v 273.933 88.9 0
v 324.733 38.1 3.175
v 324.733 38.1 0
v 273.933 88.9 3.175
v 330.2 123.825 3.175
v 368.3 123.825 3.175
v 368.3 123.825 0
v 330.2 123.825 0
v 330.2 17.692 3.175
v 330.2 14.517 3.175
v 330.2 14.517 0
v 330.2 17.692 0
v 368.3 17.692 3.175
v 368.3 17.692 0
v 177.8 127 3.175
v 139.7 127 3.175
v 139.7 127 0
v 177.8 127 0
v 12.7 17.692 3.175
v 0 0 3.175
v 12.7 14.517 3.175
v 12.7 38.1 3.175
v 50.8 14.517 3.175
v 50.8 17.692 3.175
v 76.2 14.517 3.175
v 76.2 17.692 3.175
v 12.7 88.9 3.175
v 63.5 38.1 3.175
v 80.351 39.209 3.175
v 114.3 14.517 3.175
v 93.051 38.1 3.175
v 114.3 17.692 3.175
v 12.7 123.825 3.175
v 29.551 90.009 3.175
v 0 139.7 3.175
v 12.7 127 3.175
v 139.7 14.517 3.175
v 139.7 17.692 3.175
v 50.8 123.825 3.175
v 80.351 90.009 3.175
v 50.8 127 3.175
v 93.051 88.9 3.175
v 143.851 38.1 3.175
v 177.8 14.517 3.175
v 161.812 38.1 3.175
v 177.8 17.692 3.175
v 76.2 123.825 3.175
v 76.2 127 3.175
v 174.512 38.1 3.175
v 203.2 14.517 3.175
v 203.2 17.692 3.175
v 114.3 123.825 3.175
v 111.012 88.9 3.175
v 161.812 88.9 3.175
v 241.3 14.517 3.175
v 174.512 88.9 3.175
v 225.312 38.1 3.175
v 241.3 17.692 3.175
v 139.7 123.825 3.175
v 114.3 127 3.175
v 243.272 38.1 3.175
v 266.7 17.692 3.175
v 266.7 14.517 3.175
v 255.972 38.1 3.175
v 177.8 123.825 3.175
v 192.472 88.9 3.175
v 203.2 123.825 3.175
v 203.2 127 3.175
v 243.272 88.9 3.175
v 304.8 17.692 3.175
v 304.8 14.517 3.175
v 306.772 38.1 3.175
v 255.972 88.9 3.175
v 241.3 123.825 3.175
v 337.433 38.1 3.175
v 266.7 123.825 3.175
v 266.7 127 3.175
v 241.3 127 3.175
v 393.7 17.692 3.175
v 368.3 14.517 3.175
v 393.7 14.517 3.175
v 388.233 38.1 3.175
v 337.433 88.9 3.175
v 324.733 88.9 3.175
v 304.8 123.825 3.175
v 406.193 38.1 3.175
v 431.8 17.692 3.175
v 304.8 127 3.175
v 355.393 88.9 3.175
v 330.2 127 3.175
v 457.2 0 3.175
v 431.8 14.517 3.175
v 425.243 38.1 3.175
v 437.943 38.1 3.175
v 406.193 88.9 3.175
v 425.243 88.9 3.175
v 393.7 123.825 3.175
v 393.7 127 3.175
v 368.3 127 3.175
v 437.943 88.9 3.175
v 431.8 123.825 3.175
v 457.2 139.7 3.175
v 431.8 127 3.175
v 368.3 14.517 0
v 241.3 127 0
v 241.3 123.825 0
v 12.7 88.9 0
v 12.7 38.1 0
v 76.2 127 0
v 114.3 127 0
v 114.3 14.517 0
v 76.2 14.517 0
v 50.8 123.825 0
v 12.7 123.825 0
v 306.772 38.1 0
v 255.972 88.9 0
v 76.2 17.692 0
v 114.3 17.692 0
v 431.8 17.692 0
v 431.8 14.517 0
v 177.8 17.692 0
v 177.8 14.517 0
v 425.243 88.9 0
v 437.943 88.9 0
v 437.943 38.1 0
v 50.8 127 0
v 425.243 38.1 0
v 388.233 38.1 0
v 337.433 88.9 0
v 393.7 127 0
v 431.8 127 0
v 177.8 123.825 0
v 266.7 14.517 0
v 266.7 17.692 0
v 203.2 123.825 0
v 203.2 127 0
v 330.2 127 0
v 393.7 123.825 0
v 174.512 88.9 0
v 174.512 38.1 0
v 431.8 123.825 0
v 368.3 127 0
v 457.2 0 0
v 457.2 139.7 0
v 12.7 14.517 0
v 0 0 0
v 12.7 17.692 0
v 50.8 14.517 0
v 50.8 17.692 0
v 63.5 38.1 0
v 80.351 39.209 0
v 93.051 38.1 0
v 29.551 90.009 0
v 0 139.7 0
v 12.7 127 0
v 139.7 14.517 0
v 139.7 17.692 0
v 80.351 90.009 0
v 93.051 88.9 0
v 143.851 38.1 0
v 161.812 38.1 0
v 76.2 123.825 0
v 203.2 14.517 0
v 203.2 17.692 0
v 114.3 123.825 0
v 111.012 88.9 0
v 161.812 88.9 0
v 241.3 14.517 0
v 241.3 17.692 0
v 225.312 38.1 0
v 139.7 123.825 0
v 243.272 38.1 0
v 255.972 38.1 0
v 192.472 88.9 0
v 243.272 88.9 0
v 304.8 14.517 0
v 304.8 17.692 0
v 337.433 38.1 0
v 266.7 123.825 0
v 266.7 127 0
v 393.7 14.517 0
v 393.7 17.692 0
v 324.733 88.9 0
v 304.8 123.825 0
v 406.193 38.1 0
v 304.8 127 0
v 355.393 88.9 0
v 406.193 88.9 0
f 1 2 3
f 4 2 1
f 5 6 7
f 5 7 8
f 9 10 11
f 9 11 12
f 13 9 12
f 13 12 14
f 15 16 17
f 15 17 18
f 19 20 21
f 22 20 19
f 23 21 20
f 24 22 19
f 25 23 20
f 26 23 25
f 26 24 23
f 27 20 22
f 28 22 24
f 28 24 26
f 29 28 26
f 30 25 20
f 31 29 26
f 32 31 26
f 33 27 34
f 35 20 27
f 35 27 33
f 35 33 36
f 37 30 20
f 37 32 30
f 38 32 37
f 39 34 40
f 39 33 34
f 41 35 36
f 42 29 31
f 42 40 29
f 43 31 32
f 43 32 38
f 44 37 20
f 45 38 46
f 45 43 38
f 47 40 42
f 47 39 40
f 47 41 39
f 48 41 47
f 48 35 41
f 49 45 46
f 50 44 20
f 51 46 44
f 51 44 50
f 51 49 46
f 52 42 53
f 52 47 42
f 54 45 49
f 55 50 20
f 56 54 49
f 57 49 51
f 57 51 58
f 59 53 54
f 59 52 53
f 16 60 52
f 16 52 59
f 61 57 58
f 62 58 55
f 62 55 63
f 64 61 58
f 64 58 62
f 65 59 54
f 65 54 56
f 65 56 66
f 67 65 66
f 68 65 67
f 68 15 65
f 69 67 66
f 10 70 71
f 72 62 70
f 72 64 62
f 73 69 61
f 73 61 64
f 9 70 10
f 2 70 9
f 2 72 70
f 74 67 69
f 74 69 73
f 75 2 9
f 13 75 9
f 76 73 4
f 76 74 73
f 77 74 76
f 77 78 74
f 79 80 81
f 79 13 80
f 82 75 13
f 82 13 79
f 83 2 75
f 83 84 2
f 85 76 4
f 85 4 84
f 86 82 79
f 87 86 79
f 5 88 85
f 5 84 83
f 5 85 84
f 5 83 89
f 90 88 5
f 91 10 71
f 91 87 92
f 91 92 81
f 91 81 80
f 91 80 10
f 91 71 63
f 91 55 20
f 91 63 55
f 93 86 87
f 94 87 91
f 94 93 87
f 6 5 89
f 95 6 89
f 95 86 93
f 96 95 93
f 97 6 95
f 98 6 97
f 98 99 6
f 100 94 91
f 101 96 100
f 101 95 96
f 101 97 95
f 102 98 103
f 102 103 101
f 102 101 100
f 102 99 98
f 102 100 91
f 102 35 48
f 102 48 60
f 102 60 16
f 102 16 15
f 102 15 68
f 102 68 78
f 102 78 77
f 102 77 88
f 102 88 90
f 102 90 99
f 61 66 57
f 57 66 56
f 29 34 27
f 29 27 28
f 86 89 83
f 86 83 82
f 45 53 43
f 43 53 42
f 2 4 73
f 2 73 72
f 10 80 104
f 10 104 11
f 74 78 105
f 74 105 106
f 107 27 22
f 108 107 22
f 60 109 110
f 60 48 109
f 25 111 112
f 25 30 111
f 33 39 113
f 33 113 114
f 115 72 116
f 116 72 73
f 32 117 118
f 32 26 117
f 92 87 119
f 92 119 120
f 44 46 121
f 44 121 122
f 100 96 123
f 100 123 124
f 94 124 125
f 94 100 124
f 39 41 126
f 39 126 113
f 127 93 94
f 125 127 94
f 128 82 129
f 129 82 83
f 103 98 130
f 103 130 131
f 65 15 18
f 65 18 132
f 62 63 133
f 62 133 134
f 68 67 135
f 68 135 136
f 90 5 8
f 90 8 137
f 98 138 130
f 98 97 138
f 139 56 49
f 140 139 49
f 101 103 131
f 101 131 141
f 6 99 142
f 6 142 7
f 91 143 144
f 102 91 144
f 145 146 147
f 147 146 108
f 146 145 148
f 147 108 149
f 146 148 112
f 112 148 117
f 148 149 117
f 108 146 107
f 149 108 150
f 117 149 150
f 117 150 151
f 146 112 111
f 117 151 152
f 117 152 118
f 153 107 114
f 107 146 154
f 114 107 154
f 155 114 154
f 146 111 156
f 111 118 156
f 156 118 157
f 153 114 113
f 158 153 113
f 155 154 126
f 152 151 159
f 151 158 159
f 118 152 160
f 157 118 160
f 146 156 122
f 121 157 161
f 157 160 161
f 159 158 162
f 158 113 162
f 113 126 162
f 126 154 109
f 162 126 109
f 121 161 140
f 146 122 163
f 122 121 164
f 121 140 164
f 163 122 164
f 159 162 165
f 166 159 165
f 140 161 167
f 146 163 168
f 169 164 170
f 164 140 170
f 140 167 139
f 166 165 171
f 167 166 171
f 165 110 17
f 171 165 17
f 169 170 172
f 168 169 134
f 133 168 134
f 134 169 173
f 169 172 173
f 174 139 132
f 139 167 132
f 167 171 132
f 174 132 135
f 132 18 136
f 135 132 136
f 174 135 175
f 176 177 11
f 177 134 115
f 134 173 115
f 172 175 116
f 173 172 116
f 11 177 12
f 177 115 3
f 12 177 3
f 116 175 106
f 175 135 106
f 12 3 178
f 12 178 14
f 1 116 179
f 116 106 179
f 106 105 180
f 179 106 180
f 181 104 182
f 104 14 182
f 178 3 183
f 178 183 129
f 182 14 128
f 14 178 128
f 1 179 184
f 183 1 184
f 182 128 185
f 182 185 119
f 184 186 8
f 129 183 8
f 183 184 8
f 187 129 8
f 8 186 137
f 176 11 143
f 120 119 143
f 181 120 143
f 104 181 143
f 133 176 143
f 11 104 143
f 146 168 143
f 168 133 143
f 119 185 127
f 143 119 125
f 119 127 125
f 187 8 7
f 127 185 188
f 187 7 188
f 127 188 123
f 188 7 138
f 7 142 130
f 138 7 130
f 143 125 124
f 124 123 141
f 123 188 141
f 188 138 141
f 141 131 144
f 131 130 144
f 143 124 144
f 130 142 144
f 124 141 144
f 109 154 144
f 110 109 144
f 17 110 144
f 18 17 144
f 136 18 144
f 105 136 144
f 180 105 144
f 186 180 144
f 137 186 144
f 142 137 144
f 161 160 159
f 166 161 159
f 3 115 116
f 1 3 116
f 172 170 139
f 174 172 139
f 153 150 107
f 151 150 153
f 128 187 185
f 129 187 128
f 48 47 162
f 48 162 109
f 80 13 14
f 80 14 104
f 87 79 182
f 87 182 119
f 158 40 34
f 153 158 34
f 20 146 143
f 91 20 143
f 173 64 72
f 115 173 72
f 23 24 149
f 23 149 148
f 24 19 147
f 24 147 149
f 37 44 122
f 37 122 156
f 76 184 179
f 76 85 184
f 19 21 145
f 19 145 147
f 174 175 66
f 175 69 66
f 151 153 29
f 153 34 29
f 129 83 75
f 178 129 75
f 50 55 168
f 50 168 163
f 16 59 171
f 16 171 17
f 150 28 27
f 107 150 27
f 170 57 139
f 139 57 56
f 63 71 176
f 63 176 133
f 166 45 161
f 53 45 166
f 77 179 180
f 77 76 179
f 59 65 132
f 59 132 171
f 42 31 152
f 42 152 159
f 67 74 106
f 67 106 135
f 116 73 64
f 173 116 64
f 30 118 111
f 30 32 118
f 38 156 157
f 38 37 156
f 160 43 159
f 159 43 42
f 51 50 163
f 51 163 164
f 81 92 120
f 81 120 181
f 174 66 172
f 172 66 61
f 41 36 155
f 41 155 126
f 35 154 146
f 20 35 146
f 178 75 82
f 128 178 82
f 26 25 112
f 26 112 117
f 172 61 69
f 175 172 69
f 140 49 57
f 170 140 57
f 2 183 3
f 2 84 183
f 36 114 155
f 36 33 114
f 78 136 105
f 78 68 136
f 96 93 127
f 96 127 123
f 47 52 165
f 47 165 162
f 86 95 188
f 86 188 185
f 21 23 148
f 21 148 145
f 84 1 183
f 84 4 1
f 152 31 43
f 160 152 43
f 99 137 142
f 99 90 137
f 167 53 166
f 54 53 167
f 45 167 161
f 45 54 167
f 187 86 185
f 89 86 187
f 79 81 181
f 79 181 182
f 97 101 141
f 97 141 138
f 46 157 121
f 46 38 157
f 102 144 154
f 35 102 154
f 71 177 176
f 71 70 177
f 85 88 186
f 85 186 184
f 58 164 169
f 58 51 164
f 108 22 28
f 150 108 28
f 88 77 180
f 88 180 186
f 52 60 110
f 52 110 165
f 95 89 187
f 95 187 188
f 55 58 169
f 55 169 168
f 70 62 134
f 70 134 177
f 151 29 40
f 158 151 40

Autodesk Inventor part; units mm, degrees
ref_plane "YZ Plane" through (0, 0, 0) normal (1, 0, 0) x (0, 1, 0)
ref_plane "XZ Plane" through (0, 0, 0) normal (0, 1, 0) x (-1, 0, 0)
ref_plane "XY Plane" through (0, 0, 0) normal (0, 0, 1) x (1, 0, 0)
sketch "Sketch1" plane through (0, 0, 0) normal (0, 0, 1) x (1, 0, 0)
  line L0 (0, 0) -> (457.2, 0)
  line L1 (457.2, 0) -> (457.2, 139.7)
  line L2 (457.2, 139.7) -> (0, 139.7)
  line L3 (0, 139.7) -> (0, 0)
  dimension "d0" = 457.2
  dimension "d1" = 139.7
extrude "Extrusion1" add sketch "Sketch1" along normal blind 3.175
sketch "Sketch2" plane through (0, 0, 3.175) normal (0, 0, 1) x (1, 0, 0)
  line L0 (0, 139.7) -> (0, 0) projected
  line L1 (0, 114.3) -> (457.2, 114.3)
  line L2 (457.2, 139.7) -> (0, 139.7) projected
  line L3 (0, 38.1) -> (457.2, 38.1)
  line L4 (457.2, 0) -> (457.2, 139.7) projected
  line L5 (0, 0) -> (457.2, 0) projected
  line L6 (12.7, 17.6917) -> (50.8, 17.6917)
  line L7 (50.8, 17.6917) -> (50.8, 14.5167)
  line L8 (50.8, 14.5167) -> (12.7, 14.5167)
  line L9 (12.7, 14.5167) -> (12.7, 17.6917)
  line L10 (12.7, 127) -> (50.8, 127)
  line L11 (50.8, 127) -> (50.8, 123.825)
  line L12 (50.8, 123.825) -> (12.7, 123.825)
  line L13 (12.7, 123.825) -> (12.7, 127)
  line L14 (76.2, 127) -> (114.3, 127)
  line L15 (114.3, 127) -> (114.3, 123.825)
  line L16 (114.3, 123.825) -> (76.2, 123.825)
  line L17 (76.2, 123.825) -> (76.2, 127)
  line L18 (139.7, 127) -> (177.8, 127)
  line L19 (177.8, 127) -> (177.8, 123.825)
  line L20 (177.8, 123.825) -> (139.7, 123.825)
  line L21 (139.7, 123.825) -> (139.7, 127)
  line L22 (203.2, 127) -> (241.3, 127)
  line L23 (241.3, 127) -> (241.3, 123.825)
  line L24 (241.3, 123.825) -> (203.2, 123.825)
  line L25 (203.2, 123.825) -> (203.2, 127)
  line L26 (266.7, 127) -> (304.8, 127)
  line L27 (304.8, 127) -> (304.8, 123.825)
  line L28 (304.8, 123.825) -> (266.7, 123.825)
  line L29 (266.7, 123.825) -> (266.7, 127)
  line L30 (330.2, 127) -> (368.3, 127)
  line L31 (368.3, 127) -> (368.3, 123.825)
  line L32 (368.3, 123.825) -> (330.2, 123.825)
  line L33 (330.2, 123.825) -> (330.2, 127)
  line L34 (393.7, 127) -> (431.8, 127)
  line L35 (431.8, 127) -> (431.8, 123.825)
  line L36 (431.8, 123.825) -> (393.7, 123.825)
  line L37 (393.7, 123.825) -> (393.7, 127)
  line L38 (76.2, 17.6917) -> (114.3, 17.6917)
  line L39 (114.3, 17.6917) -> (114.3, 14.5167)
  line L40 (114.3, 14.5167) -> (76.2, 14.5167)
  line L41 (76.2, 14.5167) -> (76.2, 17.6917)
  line L42 (139.7, 17.6917) -> (177.8, 17.6917)
  line L43 (177.8, 17.6917) -> (177.8, 14.5167)
  line L44 (177.8, 14.5167) -> (139.7, 14.5167)
  line L45 (139.7, 14.5167) -> (139.7, 17.6917)
  line L46 (203.2, 17.6917) -> (241.3, 17.6917)
  line L47 (241.3, 17.6917) -> (241.3, 14.5167)
  line L48 (241.3, 14.5167) -> (203.2, 14.5167)
  line L49 (203.2, 14.5167) -> (203.2, 17.6917)
  line L50 (266.7, 17.6917) -> (304.8, 17.6917)
  line L51 (304.8, 17.6917) -> (304.8, 14.5167)
  line L52 (304.8, 14.5167) -> (266.7, 14.5167)
  line L53 (266.7, 14.5167) -> (266.7, 17.6917)
  line L54 (330.2, 17.6917) -> (368.3, 17.6917)
  line L55 (368.3, 17.6917) -> (368.3, 14.5167)
  line L56 (368.3, 14.5167) -> (330.2, 14.5167)
  line L57 (330.2, 14.5167) -> (330.2, 17.6917)
  line L58 (393.7, 17.6917) -> (431.8, 17.6917)
  line L59 (431.8, 17.6917) -> (431.8, 14.5167)
  line L60 (431.8, 14.5167) -> (393.7, 14.5167)
  line L61 (393.7, 14.5167) -> (393.7, 17.6917)
  dimension "d106" = 3.175
  dimension "d107" = 25.4
  dimension "d108" = 25.4
  dimension "d109" = 12.7
  dimension "d110" = 12.7
  dimension "d111" = 25.4
  dimension "d112" = 12.7
  dimension "d113" = 25.4
  dimension "d114" = 12.7
  dimension "d115" = 25.4
  dimension "d116" = 12.7
  dimension "d117" = 25.4
  dimension "d118" = 12.7
  dimension "d119" = 25.4
  dimension "d120" = 12.7
  dimension "d121" = 12.7
  dimension "d122" = 38.1
  dimension "d123" = 38.1
  dimension "d124" = 38.1
  dimension "d125" = 38.1
  dimension "d126" = 38.1
  dimension "d127" = 38.1
  dimension "d128" = 3.175
  dimension "d129" = 3.175
  dimension "d130" = 3.175
  dimension "d131" = 3.175
  dimension "d132" = 3.175
  dimension "d133" = 3.175
  dimension "d134" = 25.4
  dimension "d135" = 38.1
  dimension "d136" = 25.4
  dimension "d137" = 38.1
  dimension "d138" = 25.4
  dimension "d139" = 38.1
  dimension "d140" = 25.4
  dimension "d141" = 38.1
  dimension "d142" = 25.4
  dimension "d143" = 38.1
  dimension "d144" = 25.4
  dimension "d145" = 38.1
  dimension "d146" = 25.4
  dimension "d147" = 38.1
  dimension "d148" = 14.5167
  dimension "d150" = 14.5167
  dimension "d151" = 3.175
  dimension "d152" = 3.175
extrude "Extrusion2" cut sketch "Sketch2" against normal through all contours L6 L7 L8 L9 | L10 L11 L12 L13 | L14 L15 L16 L17 | L18 L19 L20 L21 | L22 L23 L24 L25 | L26 L27 L28 L29 | L30 L31 L32 L33 | L34 L35 L36 L37 | L38 L39 L40 L41 | L42 L43 L44 L45 | L46 L47 L48 L49 | L50 L51 L52 L53 | L54 L55 L56 L57 | L58 L59 L60 L61
sketch "Sketch3" plane through (0, 0, 3.175) normal (0, 0, 1) x (1, 0, 0)
  line L0 (0, 139.7) -> (0, 0) projected
  line L1 (0, 38.1) -> (457.2, 38.1)
  line L2 (457.2, 0) -> (457.2, 139.7) projected
  line L3 (0, 0) -> (457.2, 0) projected
  line L4 (0, 101.6) -> (457.2, 101.6)
  line L5 (457.2, 139.7) -> (0, 139.7) projected
  line L6 (12.7, 88.9) -> (12.7, 38.1)
  line L7 (12.7, 38.1) -> (63.5, 38.1)
  line L8 (63.5, 38.1) -> (12.7, 88.9)
  line L9 (29.5512, 90.0093) -> (80.3512, 39.2093)
  line L10 (80.3512, 39.2093) -> (80.3512, 90.0093)
  line L11 (80.3512, 90.0093) -> (29.5512, 90.0093)
  line L12 (93.0512, 38.1) -> (93.0512, 88.9)
  line L13 (93.0512, 38.1) -> (143.8512, 38.1)
  line L14 (143.8512, 38.1) -> (93.0512, 88.9)
  line L15 (111.0117, 88.9) -> (161.8117, 88.9)
  line L16 (161.8117, 88.9) -> (161.8117, 38.1)
  line L17 (161.8117, 38.1) -> (111.0117, 88.9)
  line L18 (174.5117, 88.9) -> (174.5117, 38.1)
  line L19 (174.5117, 38.1) -> (225.3117, 38.1)
  line L20 (225.3117, 38.1) -> (174.5117, 88.9)
  line L21 (243.2722, 38.1) -> (243.2722, 88.9)
  line L22 (243.2722, 88.9) -> (192.4722, 88.9)
  line L23 (192.4722, 88.9) -> (243.2722, 38.1)
  line L24 (255.9722, 88.9) -> (255.9722, 38.1)
  line L25 (255.9722, 38.1) -> (306.7722, 38.1)
  line L26 (306.7722, 38.1) -> (255.9722, 88.9)
  line L27 (273.9327, 88.9) -> (324.7327, 88.9)
  line L28 (324.7327, 88.9) -> (324.7327, 38.1)
  line L29 (324.7327, 38.1) -> (273.9327, 88.9)
  line L30 (337.4327, 88.9) -> (337.4327, 38.1)
  line L31 (337.4327, 38.1) -> (388.2327, 38.1)
  line L32 (388.2327, 38.1) -> (337.4327, 88.9)
  line L33 (355.3933, 88.9) -> (406.1933, 88.9)
  line L34 (406.1933, 88.9) -> (406.1933, 38.1)
  line L35 (406.1933, 38.1) -> (355.3933, 88.9)
  line L36 (425.2433, 88.9) -> (437.9433, 88.9)
  line L37 (437.9433, 88.9) -> (437.9433, 38.1)
  line L38 (437.9433, 38.1) -> (425.2433, 38.1)
  line L39 (425.2433, 38.1) -> (425.2433, 88.9)
  point P0 (355.3933, 88.9)
  dimension "d43" = 38.1
  dimension "d44" = 38.1
  dimension "d47" = 12.7
  dimension "d49" = 50.8
  dimension "d52" = 12.7
  dimension "d55" = 50.8
  dimension "d62" = 50.8
  dimension "d64" = 12.7
  dimension "d65" = 12.7
  dimension "d66" = 50.8
  dimension "d67" = 50.8
  dimension "d68" = 12.7
  dimension "d69" = 12.7
  dimension "d71" = 50.8
  dimension "d72" = 50.8
  dimension "d73" = 12.7
  dimension "d74" = 12.7
  dimension "d75" = 50.8
  dimension "d76" = 12.7
  dimension "d77" = 12.7
  dimension "d78" = 50.8
  dimension "d79" = 50.8
  dimension "d80" = 12.7
  dimension "d81" = 12.7
  dimension "d82" = 50.8
  dimension "d83" = 50.8
  dimension "d84" = 12.7
  dimension "d85" = 12.7
  dimension "d86" = 50.8
  dimension "d87" = 50.8
  dimension "d89" = 12.7
  dimension "d90" = 12.7
  dimension "d91" = 12.7
  dimension "d92" = 50.8
  dimension "d93" = 50.8
  dimension "d94" = 50.8
  dimension "d96" = 19.05
  dimension "d153" = 0
  dimension "d154" = 0
extrude "Extrusion3" cut sketch "Sketch3" against normal through all contours L17 L15 L16 | L23 L22 L21 | L29 L27 L28 | L35 L33 L34 | L6 L8 L1 | L1 L39 L36 L37 | L12 L14 L1 | L1 L30 L32 | L18 L20 L1 | L1 L24 L26 | L11 L10 L9
properties part number "Bridge2"
